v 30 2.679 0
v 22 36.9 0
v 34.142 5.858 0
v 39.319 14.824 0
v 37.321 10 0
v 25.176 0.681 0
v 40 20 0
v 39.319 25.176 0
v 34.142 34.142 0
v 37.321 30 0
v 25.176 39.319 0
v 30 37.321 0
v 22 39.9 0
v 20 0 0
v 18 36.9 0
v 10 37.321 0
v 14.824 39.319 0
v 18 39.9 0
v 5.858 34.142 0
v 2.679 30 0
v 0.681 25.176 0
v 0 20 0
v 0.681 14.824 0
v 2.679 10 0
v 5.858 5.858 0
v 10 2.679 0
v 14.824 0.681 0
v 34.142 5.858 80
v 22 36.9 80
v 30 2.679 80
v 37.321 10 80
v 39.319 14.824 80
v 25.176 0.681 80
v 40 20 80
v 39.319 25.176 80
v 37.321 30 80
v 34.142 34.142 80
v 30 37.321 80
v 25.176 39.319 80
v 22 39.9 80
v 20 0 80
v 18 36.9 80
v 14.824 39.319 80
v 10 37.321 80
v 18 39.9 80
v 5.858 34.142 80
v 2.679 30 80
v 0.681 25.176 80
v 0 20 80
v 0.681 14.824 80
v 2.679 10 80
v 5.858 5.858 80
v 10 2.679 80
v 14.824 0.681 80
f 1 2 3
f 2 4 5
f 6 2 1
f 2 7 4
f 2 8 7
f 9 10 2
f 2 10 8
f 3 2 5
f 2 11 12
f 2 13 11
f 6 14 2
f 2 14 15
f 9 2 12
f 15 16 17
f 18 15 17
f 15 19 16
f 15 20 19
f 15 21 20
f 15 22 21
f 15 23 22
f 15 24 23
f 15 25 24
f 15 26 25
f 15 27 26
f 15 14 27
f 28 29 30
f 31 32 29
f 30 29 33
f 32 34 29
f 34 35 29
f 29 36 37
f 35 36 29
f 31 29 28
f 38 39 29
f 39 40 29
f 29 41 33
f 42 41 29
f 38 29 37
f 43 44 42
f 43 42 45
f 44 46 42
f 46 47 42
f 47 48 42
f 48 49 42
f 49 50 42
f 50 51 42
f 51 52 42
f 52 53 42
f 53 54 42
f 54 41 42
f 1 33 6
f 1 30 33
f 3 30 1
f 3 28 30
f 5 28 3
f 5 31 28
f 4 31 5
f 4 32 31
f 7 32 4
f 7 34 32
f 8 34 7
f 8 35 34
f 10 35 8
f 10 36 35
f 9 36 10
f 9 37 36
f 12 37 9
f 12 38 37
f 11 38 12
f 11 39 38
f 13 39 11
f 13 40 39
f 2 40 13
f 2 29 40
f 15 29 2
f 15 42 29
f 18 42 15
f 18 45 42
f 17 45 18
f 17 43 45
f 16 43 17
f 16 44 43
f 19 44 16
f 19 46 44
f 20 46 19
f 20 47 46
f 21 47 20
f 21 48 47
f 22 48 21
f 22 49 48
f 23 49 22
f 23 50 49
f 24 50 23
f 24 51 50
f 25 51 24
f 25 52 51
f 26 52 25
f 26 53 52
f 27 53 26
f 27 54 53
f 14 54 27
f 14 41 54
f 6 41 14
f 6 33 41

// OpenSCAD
$fn = 32;

// ----------------------------------------------------------------------
// Keyway shaft: d40 shaft, key 4 x 3 mm
// ----------------------------------------------------------------------

// --- parameters (mm) ---
shaft_r = 20;             // shaft radius
key_w = 4;                // keyway width
key_d = 3;                // keyway depth below the surface line
plate_t = 80;             // shaft length, Z (extrusion height)

shaft_d = 2 * shaft_r;  // shaft diameter
circle_step = 15;  // polygon sampling step, degrees

profile = [[14.824, 39.319], [10, 37.321], [5.858, 34.142], [2.679, 30], [0.681, 25.176], [0, 20], [0.681, 14.824], [2.679, 10], [5.858, 5.858], [10, 2.679], [14.824, 0.681], [20, 0], [25.176, 0.681], [30, 2.679], [34.142, 5.858], [37.321, 10], [39.319, 14.824], [40, 20], [39.319, 25.176], [37.321, 30], [34.142, 34.142], [30, 37.321], [25.176, 39.319], [22, 39.9], [22, 36.9], [18, 36.9], [18, 39.9]];  // primary outline, 27 points, counter clockwise

// --- the one profile operation ---
linear_extrude(height = plate_t) polygon(points = profile);
